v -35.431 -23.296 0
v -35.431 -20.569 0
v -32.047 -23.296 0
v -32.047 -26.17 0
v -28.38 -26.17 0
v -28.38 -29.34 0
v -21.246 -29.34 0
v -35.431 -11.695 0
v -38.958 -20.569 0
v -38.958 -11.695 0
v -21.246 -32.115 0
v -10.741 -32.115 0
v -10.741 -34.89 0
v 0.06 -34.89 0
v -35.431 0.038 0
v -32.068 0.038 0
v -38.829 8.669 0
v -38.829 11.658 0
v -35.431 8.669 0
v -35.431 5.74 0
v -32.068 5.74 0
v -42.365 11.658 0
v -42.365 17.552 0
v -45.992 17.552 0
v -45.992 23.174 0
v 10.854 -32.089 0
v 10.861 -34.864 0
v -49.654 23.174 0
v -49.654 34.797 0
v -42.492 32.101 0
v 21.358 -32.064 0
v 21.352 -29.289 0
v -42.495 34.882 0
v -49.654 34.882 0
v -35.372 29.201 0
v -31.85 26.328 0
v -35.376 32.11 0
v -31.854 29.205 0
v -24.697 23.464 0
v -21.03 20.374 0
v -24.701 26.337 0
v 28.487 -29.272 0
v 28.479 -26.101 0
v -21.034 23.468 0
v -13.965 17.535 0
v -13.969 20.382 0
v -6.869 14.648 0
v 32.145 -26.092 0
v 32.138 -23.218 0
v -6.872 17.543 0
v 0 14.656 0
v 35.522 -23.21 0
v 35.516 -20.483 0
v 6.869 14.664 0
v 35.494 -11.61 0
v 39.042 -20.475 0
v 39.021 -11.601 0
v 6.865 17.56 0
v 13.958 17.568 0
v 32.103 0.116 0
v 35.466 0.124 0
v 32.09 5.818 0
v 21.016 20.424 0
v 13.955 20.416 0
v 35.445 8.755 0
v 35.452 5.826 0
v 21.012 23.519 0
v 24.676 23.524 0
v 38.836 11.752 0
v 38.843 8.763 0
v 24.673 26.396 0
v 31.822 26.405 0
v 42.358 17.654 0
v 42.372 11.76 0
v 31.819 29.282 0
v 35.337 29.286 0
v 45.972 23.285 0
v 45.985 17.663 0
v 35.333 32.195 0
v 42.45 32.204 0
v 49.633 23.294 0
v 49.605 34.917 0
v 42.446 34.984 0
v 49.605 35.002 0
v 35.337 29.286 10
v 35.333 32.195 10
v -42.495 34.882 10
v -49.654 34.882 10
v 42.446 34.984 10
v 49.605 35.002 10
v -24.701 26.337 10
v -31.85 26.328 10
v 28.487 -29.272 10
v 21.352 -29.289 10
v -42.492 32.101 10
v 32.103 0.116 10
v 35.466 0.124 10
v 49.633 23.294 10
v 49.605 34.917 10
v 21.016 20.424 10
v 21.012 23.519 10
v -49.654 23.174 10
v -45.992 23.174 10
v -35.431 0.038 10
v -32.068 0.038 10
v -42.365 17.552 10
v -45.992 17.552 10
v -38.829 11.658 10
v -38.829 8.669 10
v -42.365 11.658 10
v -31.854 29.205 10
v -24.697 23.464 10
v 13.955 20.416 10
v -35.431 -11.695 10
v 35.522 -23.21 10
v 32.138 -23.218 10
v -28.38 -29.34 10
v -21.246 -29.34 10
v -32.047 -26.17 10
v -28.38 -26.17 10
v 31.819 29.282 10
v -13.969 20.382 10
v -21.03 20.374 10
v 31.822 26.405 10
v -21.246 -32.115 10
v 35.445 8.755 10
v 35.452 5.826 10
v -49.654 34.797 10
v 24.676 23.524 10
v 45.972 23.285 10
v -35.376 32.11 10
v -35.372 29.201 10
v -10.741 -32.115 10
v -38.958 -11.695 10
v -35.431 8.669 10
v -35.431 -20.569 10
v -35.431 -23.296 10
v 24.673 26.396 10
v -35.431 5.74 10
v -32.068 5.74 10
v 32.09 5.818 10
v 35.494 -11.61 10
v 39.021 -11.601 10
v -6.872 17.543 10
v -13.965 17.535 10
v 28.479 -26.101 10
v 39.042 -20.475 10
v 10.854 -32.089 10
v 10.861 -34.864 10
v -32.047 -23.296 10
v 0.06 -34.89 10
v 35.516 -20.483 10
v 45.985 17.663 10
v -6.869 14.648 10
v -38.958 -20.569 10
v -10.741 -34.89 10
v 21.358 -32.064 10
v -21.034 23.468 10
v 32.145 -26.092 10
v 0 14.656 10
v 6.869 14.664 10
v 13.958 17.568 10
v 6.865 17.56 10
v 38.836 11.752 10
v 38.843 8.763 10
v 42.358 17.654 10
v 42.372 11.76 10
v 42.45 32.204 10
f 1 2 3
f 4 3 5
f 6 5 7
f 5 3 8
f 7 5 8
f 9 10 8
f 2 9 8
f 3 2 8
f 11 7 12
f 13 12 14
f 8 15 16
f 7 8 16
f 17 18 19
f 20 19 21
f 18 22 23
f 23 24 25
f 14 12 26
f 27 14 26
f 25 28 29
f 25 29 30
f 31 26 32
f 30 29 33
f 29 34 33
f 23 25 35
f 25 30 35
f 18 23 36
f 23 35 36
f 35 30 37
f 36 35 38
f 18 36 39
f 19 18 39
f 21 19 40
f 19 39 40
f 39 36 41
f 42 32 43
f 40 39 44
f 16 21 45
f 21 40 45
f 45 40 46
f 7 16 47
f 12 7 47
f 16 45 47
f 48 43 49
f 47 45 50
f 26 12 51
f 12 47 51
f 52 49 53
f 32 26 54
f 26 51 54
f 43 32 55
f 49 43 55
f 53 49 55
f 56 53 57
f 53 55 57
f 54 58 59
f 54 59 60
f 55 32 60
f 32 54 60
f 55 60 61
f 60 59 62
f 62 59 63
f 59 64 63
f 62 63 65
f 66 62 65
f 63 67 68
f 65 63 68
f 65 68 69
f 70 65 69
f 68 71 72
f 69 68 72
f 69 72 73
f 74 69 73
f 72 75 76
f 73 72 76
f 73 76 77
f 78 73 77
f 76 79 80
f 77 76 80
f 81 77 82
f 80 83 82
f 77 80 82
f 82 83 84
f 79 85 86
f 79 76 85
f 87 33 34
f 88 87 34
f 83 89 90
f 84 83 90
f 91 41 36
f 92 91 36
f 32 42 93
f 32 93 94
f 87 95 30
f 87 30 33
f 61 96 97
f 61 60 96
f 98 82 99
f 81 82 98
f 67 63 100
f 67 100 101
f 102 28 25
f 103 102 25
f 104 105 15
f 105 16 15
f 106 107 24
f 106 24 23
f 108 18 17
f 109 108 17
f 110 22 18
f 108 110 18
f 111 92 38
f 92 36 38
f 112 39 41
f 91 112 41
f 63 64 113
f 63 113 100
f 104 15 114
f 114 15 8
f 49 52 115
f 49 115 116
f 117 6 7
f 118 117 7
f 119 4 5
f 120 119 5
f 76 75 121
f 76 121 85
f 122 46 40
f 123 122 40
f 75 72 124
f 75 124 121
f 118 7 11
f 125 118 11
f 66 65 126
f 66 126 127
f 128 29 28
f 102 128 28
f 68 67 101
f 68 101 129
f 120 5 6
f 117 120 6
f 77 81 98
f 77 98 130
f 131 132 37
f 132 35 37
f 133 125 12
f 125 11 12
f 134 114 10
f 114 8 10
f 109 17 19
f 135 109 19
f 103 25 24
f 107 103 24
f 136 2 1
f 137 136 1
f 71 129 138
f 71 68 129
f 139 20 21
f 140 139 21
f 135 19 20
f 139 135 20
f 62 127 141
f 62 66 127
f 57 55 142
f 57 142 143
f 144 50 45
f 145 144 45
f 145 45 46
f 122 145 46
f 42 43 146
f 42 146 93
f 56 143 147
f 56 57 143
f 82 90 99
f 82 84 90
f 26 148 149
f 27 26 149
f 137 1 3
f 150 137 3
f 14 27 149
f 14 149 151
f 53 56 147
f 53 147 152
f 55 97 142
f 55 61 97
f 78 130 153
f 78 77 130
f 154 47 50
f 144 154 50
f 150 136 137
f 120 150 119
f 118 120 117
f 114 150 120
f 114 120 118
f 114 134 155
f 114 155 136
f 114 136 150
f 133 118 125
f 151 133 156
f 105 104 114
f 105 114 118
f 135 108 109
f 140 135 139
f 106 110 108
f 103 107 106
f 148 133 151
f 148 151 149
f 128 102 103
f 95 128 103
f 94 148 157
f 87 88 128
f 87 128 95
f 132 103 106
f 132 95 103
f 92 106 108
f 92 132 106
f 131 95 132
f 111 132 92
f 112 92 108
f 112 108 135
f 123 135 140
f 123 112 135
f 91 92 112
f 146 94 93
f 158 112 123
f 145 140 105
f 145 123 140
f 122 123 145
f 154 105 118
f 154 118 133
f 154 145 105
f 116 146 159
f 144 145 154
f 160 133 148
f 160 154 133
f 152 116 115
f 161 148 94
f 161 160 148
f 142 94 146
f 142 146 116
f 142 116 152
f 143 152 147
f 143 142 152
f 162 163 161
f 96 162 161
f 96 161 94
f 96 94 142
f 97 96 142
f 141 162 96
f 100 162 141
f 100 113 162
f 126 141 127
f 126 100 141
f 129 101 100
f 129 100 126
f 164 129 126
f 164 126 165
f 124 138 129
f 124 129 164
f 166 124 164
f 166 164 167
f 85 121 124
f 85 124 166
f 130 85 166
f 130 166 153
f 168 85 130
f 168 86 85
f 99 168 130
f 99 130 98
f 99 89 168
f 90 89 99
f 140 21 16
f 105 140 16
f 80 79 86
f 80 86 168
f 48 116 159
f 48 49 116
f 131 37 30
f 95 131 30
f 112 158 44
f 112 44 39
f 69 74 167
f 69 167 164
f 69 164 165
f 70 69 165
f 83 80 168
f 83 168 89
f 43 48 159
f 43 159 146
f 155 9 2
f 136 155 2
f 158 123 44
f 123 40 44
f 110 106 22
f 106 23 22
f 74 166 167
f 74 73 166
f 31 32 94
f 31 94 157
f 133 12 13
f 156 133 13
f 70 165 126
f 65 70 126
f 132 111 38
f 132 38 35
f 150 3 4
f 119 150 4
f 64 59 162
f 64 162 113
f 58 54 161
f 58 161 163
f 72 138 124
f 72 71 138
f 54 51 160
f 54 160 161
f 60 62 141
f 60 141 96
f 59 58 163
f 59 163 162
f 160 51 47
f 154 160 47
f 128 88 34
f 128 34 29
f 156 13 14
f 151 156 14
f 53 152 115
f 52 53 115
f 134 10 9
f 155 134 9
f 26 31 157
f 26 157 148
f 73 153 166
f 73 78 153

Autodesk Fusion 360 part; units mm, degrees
sketch "pik-sk" plane through (0, 0, 0) normal (0, 0, 1) x (1, 0, 0)
  line L0 (-49.6541, 34.7973) -> (-49.6541, 23.1738)
  line L1 (-49.6541, 23.1738) -> (-45.9923, 23.1738)
  line L2 (-45.9923, 23.1738) -> (-45.9923, 17.5515)
  line L3 (-45.9923, 17.5515) -> (-42.3651, 17.5515)
  line L4 (-42.3651, 17.5515) -> (-42.3651, 11.6579)
  line L5 (-42.3651, 11.6579) -> (-38.829, 11.6579)
  line L6 (-38.829, 11.6579) -> (-38.829, 8.6694)
  line L7 (-38.829, 8.6694) -> (-35.4308, 8.6694)
  line L8 (-35.4308, 8.6694) -> (-35.4308, 5.7405)
  line L9 (-35.4308, 5.7405) -> (-32.068, 5.7405)
  line L10 (-32.068, 5.7405) -> (-32.068, 0.0385)
  line L11 (-32.068, 0.0385) -> (-35.4308, 0.0385)
  line L12 (-35.4308, 0.0385) -> (-35.4308, -11.6953)
  line L13 (-35.4308, -11.6953) -> (-38.9575, -11.6953)
  line L14 (-38.9575, -11.6953) -> (-38.9575, -20.569)
  line L15 (-38.9575, -20.569) -> (-35.4308, -20.569)
  line L16 (-35.4308, -20.569) -> (-35.4308, -23.2957)
  line L17 (-35.4308, -23.2957) -> (-32.0468, -23.2957)
  line L18 (-32.0468, -23.2957) -> (-32.0468, -26.1695)
  line L19 (-32.0468, -26.1695) -> (-28.3803, -26.1695)
  line L20 (-28.3803, -26.1695) -> (-28.3803, -29.3405)
  line L21 (-28.3803, -29.3405) -> (-21.2455, -29.3405)
  line L22 (-21.2455, -29.3405) -> (-21.2455, -32.1152)
  line L23 (-21.2455, -32.1152) -> (-10.7414, -32.1152)
  line L24 (-10.7414, -32.1152) -> (-10.7414, -34.8898)
  line L25 (-10.7414, -34.8898) -> (0.0599, -34.8898)
  line L26 (0, 14.6559) -> (-6.8686, 14.6476)
  line L27 (-6.8686, 14.6476) -> (-6.8721, 17.5432)
  line L28 (-6.8721, 17.5432) -> (-13.9652, 17.5346)
  line L29 (-13.9652, 17.5346) -> (-13.9687, 20.3821)
  line L30 (-13.9687, 20.3821) -> (-21.0302, 20.3735)
  line L31 (-21.0302, 20.3735) -> (-21.0339, 23.4685)
  line L32 (-21.0339, 23.4685) -> (-24.6974, 23.4641)
  line L33 (-24.6974, 23.4641) -> (-24.7009, 26.3367)
  line L34 (-24.7009, 26.3367) -> (-31.8504, 26.3281)
  line L35 (-31.8504, 26.3281) -> (-31.8539, 29.2052)
  line L36 (-31.8539, 29.2052) -> (-35.372, 29.2009)
  line L37 (-35.372, 29.2009) -> (-35.3755, 32.1099)
  line L38 (-35.3755, 32.1099) -> (-42.492, 32.1013)
  line L39 (-42.492, 32.1013) -> (-42.4954, 34.8818)
  line L40 (-42.4954, 34.8818) -> (-49.6541, 34.8818)
  line L41 (-49.6541, 34.8818) -> (-49.6541, 34.7973)
  line L42 (32.0895, 5.8181) -> (32.1032, 0.1161)
  line L43 (35.4451, 8.7551) -> (35.4522, 5.8262)
  line L44 (42.358, 17.6539) -> (42.3722, 11.7604)
  line L45 (31.8186, 29.2822) -> (35.3367, 29.2864)
  line L46 (42.4463, 34.9845) -> (49.605, 35.0018)
  line L47 (21.0163, 20.4244) -> (21.0125, 23.5194)
  line L48 (31.8221, 26.4051) -> (31.8186, 29.2822)
  line L49 (24.6761, 23.5238) -> (24.6726, 26.3964)
  line L50 (42.4497, 32.2039) -> (42.4463, 34.9845)
  line L51 (6.8651, 17.5598) -> (13.9582, 17.5684)
  line L52 (13.9548, 20.4158) -> (21.0163, 20.4244)
  line L53 (0, 14.6559) -> (6.8686, 14.6642)
  line L54 (32.1454, -26.0919) -> (28.4789, -26.1007)
  line L55 (21.3518, -29.289) -> (21.3585, -32.0637)
  line L56 (35.5224, -23.21) -> (32.1385, -23.2181)
  line L57 (35.4944, -11.6095) -> (39.0211, -11.601)
  line L58 (6.8686, 14.6642) -> (6.8651, 17.5598)
  line L59 (35.4522, 5.8262) -> (32.0895, 5.8181)
  line L60 (21.0125, 23.5194) -> (24.6761, 23.5238)
  line L61 (35.3332, 32.1953) -> (42.4497, 32.2039)
  line L62 (42.3722, 11.7604) -> (38.8361, 11.7518)
  line L63 (45.9852, 17.6627) -> (42.358, 17.6539)
  line L64 (49.6052, 34.9173) -> (49.6334, 23.2938)
  line L65 (24.6726, 26.3964) -> (31.8221, 26.4051)
  line L66 (32.1032, 0.1161) -> (35.466, 0.1242)
  line L67 (28.4866, -29.2718) -> (21.3518, -29.289)
  line L68 (35.466, 0.1242) -> (35.4944, -11.6095)
  line L69 (38.8361, 11.7518) -> (38.8433, 8.7633)
  line L70 (38.8433, 8.7633) -> (35.4451, 8.7551)
  line L71 (10.8545, -32.0891) -> (10.8612, -34.8637)
  line L72 (49.605, 35.0018) -> (49.6052, 34.9173)
  line L73 (10.8612, -34.8637) -> (0.0599, -34.8898)
  line L74 (49.6334, 23.2938) -> (45.9716, 23.2849)
  line L75 (32.1385, -23.2181) -> (32.1454, -26.0919)
  line L76 (39.0211, -11.601) -> (39.0425, -20.4747)
  line L77 (35.5158, -20.4832) -> (35.5224, -23.21)
  line L78 (39.0425, -20.4747) -> (35.5158, -20.4832)
  line L79 (35.3367, 29.2864) -> (35.3332, 32.1953)
  line L80 (45.9716, 23.2849) -> (45.9852, 17.6627)
  line L81 (13.9582, 17.5684) -> (13.9548, 20.4158)
  line L82 (28.4789, -26.1007) -> (28.4866, -29.2718)
  line L83 (21.3585, -32.0637) -> (10.8545, -32.0891)
extrude "Extrude1" add sketch "pik-sk" along normal blind 10
